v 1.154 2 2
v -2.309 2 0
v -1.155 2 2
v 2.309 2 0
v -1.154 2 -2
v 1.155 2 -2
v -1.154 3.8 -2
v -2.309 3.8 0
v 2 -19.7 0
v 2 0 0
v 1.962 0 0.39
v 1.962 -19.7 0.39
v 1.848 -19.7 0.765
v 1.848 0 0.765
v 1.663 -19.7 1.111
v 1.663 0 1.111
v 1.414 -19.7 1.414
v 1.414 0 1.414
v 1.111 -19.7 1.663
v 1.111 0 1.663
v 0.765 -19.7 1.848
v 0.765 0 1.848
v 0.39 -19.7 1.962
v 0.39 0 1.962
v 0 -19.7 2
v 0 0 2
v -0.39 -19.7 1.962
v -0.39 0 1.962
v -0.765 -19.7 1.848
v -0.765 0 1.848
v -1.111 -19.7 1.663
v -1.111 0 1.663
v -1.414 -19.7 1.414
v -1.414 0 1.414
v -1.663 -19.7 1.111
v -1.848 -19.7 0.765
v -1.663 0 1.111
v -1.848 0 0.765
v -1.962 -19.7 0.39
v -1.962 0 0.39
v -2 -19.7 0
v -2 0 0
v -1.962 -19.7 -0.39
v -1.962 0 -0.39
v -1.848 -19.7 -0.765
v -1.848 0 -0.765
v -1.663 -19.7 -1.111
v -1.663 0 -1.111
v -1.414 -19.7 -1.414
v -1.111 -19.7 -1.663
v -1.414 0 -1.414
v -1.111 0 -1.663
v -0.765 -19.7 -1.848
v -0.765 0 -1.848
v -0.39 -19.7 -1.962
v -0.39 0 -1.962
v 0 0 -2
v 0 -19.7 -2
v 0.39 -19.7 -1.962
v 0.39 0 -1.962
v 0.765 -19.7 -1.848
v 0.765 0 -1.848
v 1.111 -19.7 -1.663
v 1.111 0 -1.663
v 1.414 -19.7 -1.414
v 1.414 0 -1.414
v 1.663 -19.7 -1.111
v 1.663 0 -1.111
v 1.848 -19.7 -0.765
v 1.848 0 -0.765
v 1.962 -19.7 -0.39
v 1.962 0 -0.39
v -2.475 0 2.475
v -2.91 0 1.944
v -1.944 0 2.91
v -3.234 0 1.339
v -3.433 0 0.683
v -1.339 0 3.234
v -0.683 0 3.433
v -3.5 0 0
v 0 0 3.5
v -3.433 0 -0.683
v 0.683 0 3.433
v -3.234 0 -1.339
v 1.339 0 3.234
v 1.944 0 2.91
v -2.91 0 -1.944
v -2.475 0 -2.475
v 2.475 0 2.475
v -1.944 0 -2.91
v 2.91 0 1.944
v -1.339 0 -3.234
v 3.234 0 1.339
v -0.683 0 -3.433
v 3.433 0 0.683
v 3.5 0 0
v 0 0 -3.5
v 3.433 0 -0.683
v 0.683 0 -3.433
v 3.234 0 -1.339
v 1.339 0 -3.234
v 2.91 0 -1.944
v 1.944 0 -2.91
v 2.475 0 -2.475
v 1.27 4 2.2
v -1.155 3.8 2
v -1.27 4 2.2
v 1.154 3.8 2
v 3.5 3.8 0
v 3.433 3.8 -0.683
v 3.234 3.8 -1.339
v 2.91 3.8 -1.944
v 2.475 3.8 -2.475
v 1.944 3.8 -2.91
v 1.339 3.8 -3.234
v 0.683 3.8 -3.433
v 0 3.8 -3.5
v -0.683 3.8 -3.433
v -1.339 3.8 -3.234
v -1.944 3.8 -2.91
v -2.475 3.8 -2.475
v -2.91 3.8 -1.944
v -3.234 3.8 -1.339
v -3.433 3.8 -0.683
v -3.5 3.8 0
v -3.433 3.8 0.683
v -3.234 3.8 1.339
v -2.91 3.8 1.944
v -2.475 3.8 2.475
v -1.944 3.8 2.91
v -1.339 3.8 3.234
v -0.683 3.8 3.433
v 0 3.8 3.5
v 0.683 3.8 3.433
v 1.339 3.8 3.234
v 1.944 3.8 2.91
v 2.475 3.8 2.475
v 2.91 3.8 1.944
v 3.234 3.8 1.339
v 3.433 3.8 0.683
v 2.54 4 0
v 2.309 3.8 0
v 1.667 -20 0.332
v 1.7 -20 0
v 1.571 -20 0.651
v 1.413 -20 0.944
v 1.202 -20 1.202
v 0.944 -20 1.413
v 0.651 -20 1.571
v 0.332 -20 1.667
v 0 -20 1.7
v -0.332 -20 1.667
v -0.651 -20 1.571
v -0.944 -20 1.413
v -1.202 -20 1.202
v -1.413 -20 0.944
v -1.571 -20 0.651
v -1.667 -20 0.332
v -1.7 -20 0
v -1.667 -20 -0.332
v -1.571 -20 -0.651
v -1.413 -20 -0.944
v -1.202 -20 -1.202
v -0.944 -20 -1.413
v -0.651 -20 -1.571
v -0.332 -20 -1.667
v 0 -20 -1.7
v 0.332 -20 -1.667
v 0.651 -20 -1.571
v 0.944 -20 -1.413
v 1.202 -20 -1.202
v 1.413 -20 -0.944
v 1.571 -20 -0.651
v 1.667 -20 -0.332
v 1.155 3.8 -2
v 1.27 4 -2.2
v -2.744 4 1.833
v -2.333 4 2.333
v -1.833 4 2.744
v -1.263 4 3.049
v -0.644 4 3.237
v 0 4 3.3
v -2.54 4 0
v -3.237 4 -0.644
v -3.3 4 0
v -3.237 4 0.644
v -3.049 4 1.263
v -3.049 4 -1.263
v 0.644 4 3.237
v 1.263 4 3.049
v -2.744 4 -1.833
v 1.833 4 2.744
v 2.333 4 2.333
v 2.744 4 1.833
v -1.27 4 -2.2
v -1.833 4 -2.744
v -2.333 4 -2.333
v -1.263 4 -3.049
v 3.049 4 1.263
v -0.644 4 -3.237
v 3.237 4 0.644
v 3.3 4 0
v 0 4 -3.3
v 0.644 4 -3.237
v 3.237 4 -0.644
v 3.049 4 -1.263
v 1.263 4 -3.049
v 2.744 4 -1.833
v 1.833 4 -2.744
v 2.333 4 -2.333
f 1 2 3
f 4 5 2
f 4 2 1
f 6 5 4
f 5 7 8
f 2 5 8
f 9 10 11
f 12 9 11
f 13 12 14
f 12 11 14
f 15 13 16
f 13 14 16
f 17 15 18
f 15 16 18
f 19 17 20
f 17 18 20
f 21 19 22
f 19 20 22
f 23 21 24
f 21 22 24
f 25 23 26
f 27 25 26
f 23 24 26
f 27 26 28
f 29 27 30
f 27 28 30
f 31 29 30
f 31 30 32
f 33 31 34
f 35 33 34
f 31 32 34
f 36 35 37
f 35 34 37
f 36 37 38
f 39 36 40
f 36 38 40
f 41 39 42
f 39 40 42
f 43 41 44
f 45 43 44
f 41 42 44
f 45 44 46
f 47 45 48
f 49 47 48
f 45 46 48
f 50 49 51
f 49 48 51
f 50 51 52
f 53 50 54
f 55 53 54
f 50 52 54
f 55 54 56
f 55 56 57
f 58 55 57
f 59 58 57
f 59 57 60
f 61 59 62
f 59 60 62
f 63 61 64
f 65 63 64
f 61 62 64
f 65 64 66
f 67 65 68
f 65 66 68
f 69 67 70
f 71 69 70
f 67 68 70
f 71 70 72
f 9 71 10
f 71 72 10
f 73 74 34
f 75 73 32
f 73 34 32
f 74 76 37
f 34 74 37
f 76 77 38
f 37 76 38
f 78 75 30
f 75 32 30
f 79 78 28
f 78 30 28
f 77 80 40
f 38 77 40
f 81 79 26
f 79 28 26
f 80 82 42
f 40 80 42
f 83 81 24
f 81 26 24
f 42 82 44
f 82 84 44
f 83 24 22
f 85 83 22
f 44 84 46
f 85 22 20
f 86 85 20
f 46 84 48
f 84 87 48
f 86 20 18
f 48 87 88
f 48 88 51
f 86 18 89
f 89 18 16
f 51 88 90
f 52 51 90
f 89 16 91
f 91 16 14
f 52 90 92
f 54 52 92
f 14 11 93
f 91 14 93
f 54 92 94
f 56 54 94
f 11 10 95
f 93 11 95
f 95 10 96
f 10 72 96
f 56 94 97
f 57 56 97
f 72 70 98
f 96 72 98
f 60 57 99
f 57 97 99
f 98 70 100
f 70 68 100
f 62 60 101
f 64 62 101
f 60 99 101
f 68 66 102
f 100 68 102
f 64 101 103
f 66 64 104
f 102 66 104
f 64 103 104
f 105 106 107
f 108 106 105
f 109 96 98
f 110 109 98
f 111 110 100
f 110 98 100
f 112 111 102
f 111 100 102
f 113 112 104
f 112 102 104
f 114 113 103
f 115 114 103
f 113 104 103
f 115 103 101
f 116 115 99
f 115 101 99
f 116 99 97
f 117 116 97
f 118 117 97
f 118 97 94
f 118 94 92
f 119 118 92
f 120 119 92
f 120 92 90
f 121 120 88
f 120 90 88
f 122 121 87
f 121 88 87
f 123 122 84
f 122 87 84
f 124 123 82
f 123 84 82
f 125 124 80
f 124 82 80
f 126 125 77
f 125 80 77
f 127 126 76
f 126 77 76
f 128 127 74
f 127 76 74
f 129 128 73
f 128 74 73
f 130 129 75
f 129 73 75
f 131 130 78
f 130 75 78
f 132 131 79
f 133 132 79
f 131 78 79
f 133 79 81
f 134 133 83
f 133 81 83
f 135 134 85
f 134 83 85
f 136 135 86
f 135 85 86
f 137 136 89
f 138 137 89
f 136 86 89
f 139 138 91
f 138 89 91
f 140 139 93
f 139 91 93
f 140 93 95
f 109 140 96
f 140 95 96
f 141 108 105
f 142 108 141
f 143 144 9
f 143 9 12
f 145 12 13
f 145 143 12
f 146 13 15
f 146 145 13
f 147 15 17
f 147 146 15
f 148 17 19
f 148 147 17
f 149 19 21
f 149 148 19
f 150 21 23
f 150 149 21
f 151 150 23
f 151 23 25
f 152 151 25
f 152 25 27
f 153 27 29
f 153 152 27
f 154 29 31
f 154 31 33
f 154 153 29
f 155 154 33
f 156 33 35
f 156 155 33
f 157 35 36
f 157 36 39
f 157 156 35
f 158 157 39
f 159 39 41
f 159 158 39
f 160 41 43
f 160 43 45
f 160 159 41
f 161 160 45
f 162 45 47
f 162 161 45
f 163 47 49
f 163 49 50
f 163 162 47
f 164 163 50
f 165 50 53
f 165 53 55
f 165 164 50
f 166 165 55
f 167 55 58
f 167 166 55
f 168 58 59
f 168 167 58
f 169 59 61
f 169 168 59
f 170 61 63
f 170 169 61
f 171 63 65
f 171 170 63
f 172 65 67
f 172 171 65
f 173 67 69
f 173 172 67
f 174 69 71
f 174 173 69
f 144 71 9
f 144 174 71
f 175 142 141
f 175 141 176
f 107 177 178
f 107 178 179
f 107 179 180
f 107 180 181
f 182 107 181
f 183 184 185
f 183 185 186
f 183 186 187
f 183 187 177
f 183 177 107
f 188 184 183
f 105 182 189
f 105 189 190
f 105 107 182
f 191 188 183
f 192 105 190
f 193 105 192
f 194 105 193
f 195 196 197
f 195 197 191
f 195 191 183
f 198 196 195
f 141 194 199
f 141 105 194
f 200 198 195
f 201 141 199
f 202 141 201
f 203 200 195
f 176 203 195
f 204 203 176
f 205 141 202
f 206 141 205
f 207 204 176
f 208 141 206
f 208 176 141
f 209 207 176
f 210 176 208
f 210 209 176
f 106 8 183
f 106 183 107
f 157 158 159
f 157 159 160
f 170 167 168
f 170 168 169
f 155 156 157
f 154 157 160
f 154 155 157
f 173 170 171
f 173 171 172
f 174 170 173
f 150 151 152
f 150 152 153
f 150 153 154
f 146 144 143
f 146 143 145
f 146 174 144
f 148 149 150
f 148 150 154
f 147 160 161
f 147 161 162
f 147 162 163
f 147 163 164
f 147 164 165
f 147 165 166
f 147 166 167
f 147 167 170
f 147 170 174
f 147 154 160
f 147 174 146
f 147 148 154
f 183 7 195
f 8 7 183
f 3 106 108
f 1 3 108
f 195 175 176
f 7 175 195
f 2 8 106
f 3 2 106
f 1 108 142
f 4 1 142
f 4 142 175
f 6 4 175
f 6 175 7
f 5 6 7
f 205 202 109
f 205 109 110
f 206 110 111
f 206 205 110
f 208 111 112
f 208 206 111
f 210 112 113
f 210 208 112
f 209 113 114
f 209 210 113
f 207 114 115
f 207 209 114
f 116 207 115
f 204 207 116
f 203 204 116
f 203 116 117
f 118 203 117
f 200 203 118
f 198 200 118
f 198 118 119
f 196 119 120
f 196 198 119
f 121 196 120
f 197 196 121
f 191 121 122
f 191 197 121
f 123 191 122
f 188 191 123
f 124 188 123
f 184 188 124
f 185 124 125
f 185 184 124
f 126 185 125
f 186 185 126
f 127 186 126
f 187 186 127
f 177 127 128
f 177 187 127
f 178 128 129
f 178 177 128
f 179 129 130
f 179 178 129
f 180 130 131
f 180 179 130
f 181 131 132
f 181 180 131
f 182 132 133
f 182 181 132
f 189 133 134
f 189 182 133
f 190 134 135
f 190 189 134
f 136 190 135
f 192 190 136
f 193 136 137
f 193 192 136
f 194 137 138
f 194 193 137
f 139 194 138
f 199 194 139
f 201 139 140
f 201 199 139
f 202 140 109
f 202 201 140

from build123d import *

# Parameters (mm, degrees)
SKETCH_1_R          = 3.5
EXTRUDE_1_DEPTH     = 4
SKETCH_2_R          = 2
EXTRUDE_2_DEPTH     = 20
CUT_EXTRUDE_1_DEPTH = 2
CHAMFER_1_SIZE      = 0.2
CHAMFER_2_SIZE      = 0.3


with BuildPart() as part:
    # 草图1 → 凸台-拉伸1 (new body)
    with BuildSketch(Plane(origin=(0, 0, 0), x_dir=(1, 0, 0), z_dir=(0, 1, 0))):
        Circle(SKETCH_1_R)
    extrude(amount=EXTRUDE_1_DEPTH)

    # 草图2 → 凸台-拉伸2 (add)
    with BuildSketch(Plane.XZ):
        Circle(SKETCH_2_R)
    extrude(amount=EXTRUDE_2_DEPTH)

    # 草图11 → 切除-拉伸1 (cut)
    with BuildSketch(Plane(origin=(0, 4, 0), x_dir=(1, 0, 0), z_dir=(0, 1, 0))):
        Polygon((1.154954177, 1.999853541), (-1.154446882, 2.000146427), (-2.309401058, 0.000292887), (-1.154954177, -1.999853541), (1.154446882, -2.000146427), (2.309401058, -0.000292887), align=None)
    extrude(amount=-CUT_EXTRUDE_1_DEPTH, mode=Mode.SUBTRACT)

    # 倒角1
    chamfer_1_edges = [part.edges().sort_by_distance(p)[0] for p in [
        (1.732177617, 4, -0.999780327),
        (0.000253647, 4, -1.999999984),
        (-1.73192397, 4, -1.000219657),
        (-1.732177617, 4, 0.999780327),
        (-0.000253647, 4, 1.999999984),
        (1.73192397, 4, 1.000219657),
        (-3.5, 4, 0),
    ]]
    chamfer(chamfer_1_edges, length=CHAMFER_1_SIZE)

    # 倒角2
    chamfer_2_edges = [part.edges().sort_by_distance(p)[0] for p in [
        (-2, -20, 0),
    ]]
    chamfer(chamfer_2_edges, length=CHAMFER_2_SIZE)


solid = part.part
